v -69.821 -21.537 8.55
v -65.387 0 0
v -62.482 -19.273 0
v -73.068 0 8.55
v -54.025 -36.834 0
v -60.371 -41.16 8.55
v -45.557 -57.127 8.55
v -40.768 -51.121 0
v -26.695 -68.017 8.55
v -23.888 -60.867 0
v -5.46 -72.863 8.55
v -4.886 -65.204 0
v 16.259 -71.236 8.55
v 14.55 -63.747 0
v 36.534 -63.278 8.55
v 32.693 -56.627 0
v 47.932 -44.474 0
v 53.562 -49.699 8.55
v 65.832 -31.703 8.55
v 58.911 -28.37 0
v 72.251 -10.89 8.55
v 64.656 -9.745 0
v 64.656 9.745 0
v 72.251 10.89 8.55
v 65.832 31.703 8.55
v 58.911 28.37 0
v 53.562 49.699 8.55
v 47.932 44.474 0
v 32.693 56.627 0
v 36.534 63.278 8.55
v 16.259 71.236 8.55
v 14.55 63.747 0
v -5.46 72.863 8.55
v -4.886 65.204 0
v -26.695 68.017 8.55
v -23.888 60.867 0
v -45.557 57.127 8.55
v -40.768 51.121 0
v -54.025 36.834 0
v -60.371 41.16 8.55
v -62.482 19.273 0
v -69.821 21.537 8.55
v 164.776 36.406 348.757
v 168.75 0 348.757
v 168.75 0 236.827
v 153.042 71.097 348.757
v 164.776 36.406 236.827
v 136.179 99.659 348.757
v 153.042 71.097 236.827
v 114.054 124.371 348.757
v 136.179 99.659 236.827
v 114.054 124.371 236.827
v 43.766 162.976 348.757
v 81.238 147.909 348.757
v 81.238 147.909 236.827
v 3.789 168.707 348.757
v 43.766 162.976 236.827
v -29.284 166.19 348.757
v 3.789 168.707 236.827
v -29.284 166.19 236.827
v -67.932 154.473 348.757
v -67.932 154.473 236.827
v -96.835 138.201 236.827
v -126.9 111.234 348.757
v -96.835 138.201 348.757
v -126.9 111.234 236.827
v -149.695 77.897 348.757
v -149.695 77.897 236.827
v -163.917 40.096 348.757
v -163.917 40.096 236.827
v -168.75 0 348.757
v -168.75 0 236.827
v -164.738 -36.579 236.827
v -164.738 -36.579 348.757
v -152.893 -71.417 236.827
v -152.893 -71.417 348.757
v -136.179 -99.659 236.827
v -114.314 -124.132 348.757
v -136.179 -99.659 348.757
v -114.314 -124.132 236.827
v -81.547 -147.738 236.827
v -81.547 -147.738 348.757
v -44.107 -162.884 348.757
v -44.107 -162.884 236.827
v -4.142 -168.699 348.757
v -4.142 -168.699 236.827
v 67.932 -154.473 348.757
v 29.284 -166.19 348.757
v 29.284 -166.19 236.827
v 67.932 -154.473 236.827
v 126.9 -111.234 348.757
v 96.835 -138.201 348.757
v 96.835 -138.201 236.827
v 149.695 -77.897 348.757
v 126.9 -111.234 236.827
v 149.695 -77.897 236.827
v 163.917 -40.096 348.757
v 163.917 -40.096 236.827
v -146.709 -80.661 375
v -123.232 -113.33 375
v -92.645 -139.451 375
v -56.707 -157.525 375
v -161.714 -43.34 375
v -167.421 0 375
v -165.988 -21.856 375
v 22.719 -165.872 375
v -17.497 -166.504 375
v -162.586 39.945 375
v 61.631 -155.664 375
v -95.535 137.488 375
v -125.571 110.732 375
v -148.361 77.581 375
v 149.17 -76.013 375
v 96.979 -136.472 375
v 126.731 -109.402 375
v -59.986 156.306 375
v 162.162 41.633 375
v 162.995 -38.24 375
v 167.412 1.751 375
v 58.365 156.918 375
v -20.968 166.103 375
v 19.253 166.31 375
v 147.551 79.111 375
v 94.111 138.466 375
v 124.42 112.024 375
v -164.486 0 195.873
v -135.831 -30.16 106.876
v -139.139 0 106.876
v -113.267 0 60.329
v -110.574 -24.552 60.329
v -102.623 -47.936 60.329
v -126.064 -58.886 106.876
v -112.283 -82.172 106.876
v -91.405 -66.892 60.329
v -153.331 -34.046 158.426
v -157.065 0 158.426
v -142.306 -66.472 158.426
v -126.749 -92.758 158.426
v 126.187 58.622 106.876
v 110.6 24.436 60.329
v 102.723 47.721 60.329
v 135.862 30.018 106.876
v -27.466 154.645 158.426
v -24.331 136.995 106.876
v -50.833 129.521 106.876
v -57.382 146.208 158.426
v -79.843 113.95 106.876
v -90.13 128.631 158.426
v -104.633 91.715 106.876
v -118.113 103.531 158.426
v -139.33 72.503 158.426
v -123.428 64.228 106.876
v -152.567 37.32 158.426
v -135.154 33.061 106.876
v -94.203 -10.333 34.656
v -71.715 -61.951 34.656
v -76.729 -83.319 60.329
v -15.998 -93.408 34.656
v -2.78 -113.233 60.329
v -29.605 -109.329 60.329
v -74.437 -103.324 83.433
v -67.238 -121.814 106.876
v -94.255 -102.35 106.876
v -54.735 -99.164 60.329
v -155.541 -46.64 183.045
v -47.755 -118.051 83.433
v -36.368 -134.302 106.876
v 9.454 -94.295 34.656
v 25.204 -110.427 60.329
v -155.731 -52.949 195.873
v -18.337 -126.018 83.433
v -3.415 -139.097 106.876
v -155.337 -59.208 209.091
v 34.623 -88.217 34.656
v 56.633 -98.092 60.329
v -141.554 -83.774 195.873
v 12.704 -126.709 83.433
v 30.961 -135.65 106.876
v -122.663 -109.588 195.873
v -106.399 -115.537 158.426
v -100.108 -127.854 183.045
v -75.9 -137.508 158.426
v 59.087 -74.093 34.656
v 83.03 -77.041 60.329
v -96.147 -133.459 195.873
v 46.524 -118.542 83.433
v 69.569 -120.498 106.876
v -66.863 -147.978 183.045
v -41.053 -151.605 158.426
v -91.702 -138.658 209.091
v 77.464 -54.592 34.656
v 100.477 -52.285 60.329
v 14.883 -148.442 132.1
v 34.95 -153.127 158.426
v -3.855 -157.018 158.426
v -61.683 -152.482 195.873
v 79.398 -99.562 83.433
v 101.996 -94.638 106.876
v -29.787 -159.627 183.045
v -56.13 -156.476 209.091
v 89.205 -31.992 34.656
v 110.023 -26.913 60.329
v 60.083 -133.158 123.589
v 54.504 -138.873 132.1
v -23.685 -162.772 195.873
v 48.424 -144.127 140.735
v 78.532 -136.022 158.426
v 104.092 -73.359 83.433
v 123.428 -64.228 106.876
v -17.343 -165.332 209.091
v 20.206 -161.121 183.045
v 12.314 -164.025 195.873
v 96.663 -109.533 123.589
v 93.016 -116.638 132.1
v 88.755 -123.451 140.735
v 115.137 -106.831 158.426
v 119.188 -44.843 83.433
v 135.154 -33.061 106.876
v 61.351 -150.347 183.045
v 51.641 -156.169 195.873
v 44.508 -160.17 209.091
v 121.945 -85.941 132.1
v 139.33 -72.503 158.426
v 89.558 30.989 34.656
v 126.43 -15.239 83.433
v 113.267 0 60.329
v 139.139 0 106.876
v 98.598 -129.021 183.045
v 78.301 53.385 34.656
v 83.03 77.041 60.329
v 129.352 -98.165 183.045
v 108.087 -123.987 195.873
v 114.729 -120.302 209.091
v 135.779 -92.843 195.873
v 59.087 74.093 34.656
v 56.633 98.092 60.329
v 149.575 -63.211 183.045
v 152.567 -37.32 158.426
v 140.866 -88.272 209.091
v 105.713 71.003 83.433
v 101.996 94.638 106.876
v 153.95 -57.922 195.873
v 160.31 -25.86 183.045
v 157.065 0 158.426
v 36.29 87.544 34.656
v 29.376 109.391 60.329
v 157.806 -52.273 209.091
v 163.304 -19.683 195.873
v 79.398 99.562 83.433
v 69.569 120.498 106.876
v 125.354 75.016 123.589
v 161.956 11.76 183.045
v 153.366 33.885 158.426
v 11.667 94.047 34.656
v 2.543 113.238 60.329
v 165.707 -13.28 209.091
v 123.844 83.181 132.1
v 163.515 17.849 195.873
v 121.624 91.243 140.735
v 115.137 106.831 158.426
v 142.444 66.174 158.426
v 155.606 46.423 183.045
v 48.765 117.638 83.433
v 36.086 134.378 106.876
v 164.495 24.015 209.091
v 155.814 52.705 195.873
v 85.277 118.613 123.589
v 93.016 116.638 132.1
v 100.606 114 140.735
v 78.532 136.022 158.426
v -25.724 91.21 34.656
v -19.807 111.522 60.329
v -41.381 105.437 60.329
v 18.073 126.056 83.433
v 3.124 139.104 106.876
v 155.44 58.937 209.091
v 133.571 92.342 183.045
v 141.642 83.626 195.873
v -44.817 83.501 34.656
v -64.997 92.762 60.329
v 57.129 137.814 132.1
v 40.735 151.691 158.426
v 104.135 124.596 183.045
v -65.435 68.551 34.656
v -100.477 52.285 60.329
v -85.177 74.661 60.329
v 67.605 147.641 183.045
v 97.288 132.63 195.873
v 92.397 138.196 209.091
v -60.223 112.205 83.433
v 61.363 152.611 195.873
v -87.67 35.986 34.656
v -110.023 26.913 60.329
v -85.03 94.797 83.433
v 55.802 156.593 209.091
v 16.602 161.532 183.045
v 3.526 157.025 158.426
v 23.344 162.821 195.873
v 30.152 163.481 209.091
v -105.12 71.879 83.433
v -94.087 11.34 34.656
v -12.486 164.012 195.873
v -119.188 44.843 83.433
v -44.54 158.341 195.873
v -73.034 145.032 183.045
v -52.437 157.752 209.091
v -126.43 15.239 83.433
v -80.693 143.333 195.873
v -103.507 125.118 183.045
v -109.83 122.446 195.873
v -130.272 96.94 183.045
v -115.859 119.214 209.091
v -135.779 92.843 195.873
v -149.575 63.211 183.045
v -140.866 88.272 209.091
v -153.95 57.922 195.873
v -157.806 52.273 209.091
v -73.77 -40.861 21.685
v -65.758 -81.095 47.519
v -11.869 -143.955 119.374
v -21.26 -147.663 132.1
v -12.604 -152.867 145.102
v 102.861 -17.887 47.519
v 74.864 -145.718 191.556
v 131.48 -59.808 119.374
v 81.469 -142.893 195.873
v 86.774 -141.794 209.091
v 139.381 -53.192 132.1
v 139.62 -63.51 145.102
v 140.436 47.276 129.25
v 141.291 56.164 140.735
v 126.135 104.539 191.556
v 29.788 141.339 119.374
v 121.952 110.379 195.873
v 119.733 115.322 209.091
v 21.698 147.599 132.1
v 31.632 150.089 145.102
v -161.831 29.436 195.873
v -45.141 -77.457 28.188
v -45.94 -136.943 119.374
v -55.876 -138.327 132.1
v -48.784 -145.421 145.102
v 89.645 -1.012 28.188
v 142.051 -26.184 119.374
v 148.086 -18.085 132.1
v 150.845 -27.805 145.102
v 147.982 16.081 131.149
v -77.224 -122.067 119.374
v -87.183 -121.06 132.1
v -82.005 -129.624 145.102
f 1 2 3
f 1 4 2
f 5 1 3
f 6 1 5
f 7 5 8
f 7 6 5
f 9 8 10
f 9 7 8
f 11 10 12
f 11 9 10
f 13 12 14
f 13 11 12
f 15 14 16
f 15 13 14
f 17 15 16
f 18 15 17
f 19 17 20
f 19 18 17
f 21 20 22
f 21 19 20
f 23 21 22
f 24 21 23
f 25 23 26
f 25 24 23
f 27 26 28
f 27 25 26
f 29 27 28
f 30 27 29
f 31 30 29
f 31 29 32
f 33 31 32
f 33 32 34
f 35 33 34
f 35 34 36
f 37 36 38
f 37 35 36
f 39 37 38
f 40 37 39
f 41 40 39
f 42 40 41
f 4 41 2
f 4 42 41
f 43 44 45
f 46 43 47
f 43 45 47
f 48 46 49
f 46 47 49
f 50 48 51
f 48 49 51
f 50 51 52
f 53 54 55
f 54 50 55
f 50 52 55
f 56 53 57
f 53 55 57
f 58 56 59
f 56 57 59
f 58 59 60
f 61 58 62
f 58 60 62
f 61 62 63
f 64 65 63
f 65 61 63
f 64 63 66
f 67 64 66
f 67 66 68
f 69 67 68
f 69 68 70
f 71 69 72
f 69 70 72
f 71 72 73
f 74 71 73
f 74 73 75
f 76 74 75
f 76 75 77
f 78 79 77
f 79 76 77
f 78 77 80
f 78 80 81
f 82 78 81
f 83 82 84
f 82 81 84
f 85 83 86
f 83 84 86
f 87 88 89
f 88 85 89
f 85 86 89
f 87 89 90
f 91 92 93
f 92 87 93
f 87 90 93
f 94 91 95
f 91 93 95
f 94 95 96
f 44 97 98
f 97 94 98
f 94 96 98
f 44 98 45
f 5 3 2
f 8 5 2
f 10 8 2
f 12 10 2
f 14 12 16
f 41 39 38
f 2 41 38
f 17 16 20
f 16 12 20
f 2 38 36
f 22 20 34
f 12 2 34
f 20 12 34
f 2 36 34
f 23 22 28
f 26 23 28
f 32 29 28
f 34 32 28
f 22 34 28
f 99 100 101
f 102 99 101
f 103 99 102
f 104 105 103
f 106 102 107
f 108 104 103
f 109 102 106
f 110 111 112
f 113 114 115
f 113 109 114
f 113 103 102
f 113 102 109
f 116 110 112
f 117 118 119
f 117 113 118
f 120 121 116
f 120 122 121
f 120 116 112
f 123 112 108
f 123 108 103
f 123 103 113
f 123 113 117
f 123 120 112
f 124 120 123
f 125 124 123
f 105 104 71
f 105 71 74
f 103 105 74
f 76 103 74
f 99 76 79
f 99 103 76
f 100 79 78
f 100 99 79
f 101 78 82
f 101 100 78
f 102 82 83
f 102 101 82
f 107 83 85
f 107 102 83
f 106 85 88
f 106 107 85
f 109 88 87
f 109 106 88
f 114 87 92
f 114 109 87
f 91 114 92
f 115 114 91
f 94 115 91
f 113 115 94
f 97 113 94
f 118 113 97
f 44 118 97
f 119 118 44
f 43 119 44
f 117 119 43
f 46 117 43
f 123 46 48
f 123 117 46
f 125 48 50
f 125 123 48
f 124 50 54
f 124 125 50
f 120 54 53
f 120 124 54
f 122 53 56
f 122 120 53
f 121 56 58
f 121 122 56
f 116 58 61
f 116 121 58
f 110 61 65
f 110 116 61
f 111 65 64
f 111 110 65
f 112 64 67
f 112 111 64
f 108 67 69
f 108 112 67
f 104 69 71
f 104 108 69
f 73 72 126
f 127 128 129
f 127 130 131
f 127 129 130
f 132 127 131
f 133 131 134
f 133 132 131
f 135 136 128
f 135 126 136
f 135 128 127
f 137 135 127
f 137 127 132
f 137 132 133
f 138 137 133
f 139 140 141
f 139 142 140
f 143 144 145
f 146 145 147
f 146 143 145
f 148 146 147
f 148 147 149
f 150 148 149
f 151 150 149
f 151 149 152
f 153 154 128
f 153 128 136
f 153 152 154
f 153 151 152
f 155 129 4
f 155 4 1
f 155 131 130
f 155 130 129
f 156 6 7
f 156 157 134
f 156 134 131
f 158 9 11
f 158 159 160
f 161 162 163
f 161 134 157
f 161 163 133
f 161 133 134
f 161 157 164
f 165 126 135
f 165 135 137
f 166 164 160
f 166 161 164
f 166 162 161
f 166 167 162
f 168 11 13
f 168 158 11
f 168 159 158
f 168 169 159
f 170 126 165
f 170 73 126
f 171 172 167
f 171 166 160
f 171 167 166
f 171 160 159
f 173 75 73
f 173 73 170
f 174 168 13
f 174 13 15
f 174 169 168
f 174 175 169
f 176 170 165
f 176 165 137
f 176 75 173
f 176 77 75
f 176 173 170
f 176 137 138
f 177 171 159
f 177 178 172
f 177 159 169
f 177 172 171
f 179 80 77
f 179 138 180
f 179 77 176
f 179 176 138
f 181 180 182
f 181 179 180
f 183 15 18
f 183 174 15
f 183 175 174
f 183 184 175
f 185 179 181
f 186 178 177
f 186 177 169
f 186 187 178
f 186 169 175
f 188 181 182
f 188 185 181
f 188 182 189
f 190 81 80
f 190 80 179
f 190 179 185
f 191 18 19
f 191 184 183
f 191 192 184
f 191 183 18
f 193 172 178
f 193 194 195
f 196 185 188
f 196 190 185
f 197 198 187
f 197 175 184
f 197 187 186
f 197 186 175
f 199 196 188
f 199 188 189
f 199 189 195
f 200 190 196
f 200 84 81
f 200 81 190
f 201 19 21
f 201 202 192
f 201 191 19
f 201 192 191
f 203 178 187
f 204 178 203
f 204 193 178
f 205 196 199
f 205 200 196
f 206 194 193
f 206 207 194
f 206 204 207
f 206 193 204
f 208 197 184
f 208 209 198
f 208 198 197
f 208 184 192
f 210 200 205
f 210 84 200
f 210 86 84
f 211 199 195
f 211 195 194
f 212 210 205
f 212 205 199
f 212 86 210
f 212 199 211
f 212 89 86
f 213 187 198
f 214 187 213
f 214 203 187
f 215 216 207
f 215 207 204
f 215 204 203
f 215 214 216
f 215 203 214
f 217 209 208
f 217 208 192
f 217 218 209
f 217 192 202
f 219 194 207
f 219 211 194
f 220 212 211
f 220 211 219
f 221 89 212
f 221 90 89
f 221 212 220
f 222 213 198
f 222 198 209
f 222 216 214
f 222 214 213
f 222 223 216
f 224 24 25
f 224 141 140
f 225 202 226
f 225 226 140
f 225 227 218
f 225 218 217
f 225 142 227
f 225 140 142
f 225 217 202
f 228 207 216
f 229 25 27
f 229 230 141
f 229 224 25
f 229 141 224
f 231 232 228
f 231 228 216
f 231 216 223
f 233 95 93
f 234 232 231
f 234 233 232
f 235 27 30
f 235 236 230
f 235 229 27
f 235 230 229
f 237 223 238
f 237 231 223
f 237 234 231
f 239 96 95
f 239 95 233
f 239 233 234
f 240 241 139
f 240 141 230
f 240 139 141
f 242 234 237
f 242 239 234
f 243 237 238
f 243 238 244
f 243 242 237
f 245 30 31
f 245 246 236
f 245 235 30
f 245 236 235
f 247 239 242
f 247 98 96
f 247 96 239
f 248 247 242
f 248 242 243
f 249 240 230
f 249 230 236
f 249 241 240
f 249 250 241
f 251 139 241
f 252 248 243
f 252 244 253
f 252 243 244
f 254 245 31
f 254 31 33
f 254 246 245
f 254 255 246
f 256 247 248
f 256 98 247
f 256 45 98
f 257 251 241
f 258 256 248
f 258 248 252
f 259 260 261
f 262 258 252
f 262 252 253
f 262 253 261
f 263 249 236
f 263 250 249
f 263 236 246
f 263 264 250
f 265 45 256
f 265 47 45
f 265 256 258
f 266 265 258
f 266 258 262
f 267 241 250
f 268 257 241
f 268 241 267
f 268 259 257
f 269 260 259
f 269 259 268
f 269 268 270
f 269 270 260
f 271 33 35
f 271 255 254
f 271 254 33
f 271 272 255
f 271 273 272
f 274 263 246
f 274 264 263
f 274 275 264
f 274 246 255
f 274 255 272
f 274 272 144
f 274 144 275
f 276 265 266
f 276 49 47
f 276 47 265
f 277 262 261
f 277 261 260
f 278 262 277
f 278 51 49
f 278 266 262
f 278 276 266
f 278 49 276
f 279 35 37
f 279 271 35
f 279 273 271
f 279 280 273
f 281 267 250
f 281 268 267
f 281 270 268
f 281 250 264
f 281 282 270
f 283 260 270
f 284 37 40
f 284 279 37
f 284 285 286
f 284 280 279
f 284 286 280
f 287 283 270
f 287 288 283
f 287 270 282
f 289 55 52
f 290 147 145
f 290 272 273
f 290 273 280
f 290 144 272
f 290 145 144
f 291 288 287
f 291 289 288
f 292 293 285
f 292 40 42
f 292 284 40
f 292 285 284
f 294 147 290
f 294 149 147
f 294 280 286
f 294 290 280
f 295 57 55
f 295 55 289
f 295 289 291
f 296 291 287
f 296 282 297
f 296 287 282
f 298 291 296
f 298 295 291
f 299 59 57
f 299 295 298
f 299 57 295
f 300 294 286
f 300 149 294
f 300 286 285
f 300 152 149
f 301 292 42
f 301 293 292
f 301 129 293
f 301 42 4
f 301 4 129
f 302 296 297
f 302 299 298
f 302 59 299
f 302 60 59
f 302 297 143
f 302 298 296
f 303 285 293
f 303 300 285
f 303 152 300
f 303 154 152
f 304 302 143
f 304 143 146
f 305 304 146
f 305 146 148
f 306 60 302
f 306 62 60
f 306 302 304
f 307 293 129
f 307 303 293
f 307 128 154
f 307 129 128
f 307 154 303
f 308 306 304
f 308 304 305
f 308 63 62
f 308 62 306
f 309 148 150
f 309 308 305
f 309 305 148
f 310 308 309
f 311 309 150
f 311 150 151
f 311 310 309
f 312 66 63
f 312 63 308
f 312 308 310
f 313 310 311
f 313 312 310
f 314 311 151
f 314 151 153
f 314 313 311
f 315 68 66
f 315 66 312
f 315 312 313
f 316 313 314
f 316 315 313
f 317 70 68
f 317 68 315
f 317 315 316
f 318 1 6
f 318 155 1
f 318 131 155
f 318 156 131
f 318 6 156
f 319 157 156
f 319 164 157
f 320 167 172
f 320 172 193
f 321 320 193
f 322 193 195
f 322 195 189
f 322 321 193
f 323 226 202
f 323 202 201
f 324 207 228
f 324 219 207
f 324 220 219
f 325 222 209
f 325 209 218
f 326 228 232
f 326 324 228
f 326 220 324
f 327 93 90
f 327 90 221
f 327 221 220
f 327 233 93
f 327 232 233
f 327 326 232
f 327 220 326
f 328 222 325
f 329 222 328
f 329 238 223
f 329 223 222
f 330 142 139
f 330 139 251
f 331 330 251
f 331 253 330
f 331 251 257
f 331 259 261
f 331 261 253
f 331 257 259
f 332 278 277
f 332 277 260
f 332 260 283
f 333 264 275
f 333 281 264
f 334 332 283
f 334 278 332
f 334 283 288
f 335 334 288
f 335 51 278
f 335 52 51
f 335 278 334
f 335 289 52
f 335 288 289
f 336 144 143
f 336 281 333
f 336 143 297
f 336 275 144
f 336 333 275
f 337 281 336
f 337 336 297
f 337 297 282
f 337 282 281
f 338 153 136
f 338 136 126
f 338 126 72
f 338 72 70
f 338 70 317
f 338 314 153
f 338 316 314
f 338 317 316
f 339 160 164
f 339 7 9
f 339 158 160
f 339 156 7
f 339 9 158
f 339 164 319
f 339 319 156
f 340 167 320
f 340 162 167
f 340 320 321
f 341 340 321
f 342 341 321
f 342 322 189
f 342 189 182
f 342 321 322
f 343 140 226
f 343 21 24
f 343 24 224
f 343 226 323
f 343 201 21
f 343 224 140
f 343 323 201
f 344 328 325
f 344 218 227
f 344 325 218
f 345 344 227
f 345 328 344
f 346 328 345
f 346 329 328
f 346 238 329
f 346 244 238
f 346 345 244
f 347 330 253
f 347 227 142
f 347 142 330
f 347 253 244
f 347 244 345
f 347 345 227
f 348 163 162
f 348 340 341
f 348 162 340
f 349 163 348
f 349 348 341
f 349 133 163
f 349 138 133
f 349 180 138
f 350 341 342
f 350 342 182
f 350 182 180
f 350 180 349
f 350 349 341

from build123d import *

# Parameters (mm, degrees)
F0_R     = 225
F1_DEPTH = 500
F5_SCALE = 0.75


with BuildPart() as f1:
    # F0 (on Top) → F1 (new body)
    with BuildSketch(Plane.XY):
        Circle(F0_R)
    extrude(amount=F1_DEPTH)

    # F2 (on Front) → F4 (revolve, cut)
    with BuildSketch(Plane.XZ):
        with BuildLine():
            Line((-370.3630566597, 0), (-87.1822908521, 0))
            add(Edge.make_bspline(
                [(-87.1822908521, 0), (-90.6749721594, 3.8222254673), (-94.0881927527, 7.6209101654), (-97.4234330683, 11.3993561694)],
                knots=[0, 0, 0, 0, 13.9758277665, 13.9758277665, 13.9758277665, 13.9758277665], degree=3))
            add(Edge.make_bspline(
                [(-97.4234330683, 11.3993561694), (-220.0127632021, 150.279053206), (-237.2517737021, 261.8165432768), (-222.6538360119, 509.9815130234)],
                knots=[13.9758277665, 13.9758277665, 13.9758277665, 13.9758277665, 527.6681563005, 527.6681563005, 527.6681563005, 527.6681563005], degree=3))
            Line((-222.6538360119, 509.9815130234), (-370.3630566597, 526.1934995651))
            Line((-370.3630566597, 526.1934995651), (-370.3630566597, 0))
        make_face()
        with BuildLine():
            add(Edge.make_bspline(
                [(-87.1822908521, 0), (-90.6749721594, 3.8222254673), (-94.0881927527, 7.6209101654), (-97.4234330683, 11.3993561694)],
                knots=[0, 0, 0, 0, 13.9758277665, 13.9758277665, 13.9758277665, 13.9758277665], degree=3))
            Line((-87.1822908521, 0), (-97.4234330683, 11.3993561694))
        make_face()
    revolve(axis=Axis((0, 0, 313.555), (0, 0, 1)), mode=Mode.SUBTRACT)


with BuildPart() as f1_1:
    # F5: moved
    add(f1.part.scale(F5_SCALE))


solid = f1_1.part
